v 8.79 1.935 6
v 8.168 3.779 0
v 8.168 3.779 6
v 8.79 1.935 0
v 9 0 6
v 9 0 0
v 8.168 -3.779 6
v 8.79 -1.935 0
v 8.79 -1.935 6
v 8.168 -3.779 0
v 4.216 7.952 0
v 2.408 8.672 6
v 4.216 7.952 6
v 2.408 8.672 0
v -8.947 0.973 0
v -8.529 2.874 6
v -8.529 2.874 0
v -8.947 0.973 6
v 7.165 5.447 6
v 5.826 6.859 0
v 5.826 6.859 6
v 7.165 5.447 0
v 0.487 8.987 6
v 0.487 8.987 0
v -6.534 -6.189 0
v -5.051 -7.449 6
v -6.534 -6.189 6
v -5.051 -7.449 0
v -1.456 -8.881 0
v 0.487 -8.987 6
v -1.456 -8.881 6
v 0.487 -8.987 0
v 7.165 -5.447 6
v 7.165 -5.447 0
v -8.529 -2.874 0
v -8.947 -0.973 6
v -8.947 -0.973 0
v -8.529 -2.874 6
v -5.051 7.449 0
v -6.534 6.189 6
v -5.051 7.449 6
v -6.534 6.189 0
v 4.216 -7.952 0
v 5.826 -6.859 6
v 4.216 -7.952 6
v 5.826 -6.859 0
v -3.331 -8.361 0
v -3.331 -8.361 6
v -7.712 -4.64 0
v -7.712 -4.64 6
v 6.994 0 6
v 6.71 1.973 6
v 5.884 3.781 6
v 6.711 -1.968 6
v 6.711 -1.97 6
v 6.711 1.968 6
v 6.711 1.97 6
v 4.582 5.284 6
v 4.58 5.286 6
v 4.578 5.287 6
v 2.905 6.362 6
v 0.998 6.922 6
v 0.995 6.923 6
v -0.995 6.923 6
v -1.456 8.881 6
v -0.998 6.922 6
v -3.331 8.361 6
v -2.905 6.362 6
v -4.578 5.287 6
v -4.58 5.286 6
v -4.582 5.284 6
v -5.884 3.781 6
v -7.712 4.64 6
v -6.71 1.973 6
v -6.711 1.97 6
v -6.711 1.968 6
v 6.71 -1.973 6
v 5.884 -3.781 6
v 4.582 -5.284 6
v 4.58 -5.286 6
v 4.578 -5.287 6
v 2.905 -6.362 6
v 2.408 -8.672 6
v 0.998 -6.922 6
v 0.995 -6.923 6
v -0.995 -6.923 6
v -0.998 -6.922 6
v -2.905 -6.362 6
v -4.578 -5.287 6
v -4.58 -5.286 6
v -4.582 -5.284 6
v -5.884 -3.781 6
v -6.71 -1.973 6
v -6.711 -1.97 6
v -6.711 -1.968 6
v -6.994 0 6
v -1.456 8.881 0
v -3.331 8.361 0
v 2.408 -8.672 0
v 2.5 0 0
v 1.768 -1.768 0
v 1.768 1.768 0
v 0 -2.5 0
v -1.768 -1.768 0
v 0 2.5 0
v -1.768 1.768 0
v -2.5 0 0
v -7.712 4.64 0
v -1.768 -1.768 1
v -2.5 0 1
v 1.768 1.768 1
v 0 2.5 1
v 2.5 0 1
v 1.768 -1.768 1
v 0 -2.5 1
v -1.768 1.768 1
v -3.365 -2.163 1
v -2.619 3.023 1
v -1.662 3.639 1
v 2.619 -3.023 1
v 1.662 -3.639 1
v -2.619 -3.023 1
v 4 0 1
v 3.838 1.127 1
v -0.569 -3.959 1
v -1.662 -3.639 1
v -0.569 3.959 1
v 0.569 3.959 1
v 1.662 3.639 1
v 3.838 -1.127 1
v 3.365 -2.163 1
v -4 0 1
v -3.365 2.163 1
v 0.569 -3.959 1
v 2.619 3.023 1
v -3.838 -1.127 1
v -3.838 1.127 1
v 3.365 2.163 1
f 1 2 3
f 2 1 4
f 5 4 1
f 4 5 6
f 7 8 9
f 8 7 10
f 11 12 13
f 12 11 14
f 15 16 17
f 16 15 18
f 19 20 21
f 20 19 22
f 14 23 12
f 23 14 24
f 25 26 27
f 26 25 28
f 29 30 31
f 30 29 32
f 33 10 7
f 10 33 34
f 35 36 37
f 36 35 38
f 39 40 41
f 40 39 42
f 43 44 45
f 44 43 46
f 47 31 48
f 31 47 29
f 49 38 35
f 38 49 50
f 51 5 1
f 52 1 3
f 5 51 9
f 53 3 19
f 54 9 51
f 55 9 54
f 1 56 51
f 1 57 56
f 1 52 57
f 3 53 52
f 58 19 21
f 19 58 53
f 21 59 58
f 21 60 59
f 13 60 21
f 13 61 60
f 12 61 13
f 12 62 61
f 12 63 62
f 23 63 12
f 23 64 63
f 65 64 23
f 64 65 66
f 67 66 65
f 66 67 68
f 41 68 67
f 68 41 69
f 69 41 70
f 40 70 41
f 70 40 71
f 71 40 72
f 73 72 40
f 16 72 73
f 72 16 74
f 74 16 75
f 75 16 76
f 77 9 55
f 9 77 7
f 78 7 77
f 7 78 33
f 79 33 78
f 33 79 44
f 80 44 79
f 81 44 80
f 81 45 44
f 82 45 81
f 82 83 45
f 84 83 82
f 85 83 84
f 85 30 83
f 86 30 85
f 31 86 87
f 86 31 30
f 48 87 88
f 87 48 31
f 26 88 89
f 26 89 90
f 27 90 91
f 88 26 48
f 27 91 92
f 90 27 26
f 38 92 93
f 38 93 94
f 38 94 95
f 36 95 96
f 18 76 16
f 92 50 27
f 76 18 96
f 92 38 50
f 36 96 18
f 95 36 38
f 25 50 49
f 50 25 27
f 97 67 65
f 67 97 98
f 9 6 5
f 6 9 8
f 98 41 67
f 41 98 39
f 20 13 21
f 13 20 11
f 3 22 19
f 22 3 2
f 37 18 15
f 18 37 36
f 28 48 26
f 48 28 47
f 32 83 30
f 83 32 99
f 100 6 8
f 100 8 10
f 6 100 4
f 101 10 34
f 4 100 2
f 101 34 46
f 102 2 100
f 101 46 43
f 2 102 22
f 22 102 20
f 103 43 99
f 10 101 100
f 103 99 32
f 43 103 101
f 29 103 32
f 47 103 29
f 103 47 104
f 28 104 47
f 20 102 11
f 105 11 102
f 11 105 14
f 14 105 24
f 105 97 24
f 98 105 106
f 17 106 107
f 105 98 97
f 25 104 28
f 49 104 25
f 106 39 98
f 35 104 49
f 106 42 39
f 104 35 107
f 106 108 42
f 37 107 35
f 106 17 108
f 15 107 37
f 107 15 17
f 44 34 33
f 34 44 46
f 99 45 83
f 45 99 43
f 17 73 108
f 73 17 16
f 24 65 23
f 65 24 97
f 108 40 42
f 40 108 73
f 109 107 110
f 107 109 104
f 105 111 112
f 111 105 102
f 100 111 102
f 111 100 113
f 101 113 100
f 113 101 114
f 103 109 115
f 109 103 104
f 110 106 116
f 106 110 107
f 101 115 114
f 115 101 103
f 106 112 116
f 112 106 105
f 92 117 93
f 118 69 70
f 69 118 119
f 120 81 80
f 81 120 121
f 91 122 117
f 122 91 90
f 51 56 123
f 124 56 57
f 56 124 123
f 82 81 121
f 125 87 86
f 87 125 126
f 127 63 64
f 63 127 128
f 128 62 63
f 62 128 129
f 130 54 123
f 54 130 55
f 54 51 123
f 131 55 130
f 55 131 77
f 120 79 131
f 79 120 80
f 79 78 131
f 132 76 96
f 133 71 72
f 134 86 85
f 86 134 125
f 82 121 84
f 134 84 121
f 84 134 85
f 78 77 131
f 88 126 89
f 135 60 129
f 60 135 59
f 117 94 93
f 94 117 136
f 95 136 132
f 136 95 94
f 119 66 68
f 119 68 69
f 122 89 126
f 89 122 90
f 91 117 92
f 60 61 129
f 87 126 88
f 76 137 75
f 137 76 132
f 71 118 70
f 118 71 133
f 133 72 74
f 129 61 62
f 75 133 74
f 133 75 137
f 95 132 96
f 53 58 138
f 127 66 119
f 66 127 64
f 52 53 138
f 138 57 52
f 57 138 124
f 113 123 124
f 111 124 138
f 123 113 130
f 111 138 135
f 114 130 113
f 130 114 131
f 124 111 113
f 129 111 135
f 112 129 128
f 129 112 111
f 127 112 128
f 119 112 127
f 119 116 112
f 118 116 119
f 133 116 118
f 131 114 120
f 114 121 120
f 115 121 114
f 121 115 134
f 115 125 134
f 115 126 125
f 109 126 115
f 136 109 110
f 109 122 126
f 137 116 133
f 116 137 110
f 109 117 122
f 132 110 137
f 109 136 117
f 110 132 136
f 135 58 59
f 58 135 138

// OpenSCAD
// indlæg til kopper i home trainer, til at centrere bolte i home trainer

difference() {
	color ([1,0,0]) cylinder (r=9,h=6);
	translate([0,0,-1]) {	color ([1,0,0]) cylinder (r=2.5,h=3);	}

	translate([0,0,1]) {
		color ([1,0,0]) cylinder (r2=7, r1=4,h=5.01);
	}
}
